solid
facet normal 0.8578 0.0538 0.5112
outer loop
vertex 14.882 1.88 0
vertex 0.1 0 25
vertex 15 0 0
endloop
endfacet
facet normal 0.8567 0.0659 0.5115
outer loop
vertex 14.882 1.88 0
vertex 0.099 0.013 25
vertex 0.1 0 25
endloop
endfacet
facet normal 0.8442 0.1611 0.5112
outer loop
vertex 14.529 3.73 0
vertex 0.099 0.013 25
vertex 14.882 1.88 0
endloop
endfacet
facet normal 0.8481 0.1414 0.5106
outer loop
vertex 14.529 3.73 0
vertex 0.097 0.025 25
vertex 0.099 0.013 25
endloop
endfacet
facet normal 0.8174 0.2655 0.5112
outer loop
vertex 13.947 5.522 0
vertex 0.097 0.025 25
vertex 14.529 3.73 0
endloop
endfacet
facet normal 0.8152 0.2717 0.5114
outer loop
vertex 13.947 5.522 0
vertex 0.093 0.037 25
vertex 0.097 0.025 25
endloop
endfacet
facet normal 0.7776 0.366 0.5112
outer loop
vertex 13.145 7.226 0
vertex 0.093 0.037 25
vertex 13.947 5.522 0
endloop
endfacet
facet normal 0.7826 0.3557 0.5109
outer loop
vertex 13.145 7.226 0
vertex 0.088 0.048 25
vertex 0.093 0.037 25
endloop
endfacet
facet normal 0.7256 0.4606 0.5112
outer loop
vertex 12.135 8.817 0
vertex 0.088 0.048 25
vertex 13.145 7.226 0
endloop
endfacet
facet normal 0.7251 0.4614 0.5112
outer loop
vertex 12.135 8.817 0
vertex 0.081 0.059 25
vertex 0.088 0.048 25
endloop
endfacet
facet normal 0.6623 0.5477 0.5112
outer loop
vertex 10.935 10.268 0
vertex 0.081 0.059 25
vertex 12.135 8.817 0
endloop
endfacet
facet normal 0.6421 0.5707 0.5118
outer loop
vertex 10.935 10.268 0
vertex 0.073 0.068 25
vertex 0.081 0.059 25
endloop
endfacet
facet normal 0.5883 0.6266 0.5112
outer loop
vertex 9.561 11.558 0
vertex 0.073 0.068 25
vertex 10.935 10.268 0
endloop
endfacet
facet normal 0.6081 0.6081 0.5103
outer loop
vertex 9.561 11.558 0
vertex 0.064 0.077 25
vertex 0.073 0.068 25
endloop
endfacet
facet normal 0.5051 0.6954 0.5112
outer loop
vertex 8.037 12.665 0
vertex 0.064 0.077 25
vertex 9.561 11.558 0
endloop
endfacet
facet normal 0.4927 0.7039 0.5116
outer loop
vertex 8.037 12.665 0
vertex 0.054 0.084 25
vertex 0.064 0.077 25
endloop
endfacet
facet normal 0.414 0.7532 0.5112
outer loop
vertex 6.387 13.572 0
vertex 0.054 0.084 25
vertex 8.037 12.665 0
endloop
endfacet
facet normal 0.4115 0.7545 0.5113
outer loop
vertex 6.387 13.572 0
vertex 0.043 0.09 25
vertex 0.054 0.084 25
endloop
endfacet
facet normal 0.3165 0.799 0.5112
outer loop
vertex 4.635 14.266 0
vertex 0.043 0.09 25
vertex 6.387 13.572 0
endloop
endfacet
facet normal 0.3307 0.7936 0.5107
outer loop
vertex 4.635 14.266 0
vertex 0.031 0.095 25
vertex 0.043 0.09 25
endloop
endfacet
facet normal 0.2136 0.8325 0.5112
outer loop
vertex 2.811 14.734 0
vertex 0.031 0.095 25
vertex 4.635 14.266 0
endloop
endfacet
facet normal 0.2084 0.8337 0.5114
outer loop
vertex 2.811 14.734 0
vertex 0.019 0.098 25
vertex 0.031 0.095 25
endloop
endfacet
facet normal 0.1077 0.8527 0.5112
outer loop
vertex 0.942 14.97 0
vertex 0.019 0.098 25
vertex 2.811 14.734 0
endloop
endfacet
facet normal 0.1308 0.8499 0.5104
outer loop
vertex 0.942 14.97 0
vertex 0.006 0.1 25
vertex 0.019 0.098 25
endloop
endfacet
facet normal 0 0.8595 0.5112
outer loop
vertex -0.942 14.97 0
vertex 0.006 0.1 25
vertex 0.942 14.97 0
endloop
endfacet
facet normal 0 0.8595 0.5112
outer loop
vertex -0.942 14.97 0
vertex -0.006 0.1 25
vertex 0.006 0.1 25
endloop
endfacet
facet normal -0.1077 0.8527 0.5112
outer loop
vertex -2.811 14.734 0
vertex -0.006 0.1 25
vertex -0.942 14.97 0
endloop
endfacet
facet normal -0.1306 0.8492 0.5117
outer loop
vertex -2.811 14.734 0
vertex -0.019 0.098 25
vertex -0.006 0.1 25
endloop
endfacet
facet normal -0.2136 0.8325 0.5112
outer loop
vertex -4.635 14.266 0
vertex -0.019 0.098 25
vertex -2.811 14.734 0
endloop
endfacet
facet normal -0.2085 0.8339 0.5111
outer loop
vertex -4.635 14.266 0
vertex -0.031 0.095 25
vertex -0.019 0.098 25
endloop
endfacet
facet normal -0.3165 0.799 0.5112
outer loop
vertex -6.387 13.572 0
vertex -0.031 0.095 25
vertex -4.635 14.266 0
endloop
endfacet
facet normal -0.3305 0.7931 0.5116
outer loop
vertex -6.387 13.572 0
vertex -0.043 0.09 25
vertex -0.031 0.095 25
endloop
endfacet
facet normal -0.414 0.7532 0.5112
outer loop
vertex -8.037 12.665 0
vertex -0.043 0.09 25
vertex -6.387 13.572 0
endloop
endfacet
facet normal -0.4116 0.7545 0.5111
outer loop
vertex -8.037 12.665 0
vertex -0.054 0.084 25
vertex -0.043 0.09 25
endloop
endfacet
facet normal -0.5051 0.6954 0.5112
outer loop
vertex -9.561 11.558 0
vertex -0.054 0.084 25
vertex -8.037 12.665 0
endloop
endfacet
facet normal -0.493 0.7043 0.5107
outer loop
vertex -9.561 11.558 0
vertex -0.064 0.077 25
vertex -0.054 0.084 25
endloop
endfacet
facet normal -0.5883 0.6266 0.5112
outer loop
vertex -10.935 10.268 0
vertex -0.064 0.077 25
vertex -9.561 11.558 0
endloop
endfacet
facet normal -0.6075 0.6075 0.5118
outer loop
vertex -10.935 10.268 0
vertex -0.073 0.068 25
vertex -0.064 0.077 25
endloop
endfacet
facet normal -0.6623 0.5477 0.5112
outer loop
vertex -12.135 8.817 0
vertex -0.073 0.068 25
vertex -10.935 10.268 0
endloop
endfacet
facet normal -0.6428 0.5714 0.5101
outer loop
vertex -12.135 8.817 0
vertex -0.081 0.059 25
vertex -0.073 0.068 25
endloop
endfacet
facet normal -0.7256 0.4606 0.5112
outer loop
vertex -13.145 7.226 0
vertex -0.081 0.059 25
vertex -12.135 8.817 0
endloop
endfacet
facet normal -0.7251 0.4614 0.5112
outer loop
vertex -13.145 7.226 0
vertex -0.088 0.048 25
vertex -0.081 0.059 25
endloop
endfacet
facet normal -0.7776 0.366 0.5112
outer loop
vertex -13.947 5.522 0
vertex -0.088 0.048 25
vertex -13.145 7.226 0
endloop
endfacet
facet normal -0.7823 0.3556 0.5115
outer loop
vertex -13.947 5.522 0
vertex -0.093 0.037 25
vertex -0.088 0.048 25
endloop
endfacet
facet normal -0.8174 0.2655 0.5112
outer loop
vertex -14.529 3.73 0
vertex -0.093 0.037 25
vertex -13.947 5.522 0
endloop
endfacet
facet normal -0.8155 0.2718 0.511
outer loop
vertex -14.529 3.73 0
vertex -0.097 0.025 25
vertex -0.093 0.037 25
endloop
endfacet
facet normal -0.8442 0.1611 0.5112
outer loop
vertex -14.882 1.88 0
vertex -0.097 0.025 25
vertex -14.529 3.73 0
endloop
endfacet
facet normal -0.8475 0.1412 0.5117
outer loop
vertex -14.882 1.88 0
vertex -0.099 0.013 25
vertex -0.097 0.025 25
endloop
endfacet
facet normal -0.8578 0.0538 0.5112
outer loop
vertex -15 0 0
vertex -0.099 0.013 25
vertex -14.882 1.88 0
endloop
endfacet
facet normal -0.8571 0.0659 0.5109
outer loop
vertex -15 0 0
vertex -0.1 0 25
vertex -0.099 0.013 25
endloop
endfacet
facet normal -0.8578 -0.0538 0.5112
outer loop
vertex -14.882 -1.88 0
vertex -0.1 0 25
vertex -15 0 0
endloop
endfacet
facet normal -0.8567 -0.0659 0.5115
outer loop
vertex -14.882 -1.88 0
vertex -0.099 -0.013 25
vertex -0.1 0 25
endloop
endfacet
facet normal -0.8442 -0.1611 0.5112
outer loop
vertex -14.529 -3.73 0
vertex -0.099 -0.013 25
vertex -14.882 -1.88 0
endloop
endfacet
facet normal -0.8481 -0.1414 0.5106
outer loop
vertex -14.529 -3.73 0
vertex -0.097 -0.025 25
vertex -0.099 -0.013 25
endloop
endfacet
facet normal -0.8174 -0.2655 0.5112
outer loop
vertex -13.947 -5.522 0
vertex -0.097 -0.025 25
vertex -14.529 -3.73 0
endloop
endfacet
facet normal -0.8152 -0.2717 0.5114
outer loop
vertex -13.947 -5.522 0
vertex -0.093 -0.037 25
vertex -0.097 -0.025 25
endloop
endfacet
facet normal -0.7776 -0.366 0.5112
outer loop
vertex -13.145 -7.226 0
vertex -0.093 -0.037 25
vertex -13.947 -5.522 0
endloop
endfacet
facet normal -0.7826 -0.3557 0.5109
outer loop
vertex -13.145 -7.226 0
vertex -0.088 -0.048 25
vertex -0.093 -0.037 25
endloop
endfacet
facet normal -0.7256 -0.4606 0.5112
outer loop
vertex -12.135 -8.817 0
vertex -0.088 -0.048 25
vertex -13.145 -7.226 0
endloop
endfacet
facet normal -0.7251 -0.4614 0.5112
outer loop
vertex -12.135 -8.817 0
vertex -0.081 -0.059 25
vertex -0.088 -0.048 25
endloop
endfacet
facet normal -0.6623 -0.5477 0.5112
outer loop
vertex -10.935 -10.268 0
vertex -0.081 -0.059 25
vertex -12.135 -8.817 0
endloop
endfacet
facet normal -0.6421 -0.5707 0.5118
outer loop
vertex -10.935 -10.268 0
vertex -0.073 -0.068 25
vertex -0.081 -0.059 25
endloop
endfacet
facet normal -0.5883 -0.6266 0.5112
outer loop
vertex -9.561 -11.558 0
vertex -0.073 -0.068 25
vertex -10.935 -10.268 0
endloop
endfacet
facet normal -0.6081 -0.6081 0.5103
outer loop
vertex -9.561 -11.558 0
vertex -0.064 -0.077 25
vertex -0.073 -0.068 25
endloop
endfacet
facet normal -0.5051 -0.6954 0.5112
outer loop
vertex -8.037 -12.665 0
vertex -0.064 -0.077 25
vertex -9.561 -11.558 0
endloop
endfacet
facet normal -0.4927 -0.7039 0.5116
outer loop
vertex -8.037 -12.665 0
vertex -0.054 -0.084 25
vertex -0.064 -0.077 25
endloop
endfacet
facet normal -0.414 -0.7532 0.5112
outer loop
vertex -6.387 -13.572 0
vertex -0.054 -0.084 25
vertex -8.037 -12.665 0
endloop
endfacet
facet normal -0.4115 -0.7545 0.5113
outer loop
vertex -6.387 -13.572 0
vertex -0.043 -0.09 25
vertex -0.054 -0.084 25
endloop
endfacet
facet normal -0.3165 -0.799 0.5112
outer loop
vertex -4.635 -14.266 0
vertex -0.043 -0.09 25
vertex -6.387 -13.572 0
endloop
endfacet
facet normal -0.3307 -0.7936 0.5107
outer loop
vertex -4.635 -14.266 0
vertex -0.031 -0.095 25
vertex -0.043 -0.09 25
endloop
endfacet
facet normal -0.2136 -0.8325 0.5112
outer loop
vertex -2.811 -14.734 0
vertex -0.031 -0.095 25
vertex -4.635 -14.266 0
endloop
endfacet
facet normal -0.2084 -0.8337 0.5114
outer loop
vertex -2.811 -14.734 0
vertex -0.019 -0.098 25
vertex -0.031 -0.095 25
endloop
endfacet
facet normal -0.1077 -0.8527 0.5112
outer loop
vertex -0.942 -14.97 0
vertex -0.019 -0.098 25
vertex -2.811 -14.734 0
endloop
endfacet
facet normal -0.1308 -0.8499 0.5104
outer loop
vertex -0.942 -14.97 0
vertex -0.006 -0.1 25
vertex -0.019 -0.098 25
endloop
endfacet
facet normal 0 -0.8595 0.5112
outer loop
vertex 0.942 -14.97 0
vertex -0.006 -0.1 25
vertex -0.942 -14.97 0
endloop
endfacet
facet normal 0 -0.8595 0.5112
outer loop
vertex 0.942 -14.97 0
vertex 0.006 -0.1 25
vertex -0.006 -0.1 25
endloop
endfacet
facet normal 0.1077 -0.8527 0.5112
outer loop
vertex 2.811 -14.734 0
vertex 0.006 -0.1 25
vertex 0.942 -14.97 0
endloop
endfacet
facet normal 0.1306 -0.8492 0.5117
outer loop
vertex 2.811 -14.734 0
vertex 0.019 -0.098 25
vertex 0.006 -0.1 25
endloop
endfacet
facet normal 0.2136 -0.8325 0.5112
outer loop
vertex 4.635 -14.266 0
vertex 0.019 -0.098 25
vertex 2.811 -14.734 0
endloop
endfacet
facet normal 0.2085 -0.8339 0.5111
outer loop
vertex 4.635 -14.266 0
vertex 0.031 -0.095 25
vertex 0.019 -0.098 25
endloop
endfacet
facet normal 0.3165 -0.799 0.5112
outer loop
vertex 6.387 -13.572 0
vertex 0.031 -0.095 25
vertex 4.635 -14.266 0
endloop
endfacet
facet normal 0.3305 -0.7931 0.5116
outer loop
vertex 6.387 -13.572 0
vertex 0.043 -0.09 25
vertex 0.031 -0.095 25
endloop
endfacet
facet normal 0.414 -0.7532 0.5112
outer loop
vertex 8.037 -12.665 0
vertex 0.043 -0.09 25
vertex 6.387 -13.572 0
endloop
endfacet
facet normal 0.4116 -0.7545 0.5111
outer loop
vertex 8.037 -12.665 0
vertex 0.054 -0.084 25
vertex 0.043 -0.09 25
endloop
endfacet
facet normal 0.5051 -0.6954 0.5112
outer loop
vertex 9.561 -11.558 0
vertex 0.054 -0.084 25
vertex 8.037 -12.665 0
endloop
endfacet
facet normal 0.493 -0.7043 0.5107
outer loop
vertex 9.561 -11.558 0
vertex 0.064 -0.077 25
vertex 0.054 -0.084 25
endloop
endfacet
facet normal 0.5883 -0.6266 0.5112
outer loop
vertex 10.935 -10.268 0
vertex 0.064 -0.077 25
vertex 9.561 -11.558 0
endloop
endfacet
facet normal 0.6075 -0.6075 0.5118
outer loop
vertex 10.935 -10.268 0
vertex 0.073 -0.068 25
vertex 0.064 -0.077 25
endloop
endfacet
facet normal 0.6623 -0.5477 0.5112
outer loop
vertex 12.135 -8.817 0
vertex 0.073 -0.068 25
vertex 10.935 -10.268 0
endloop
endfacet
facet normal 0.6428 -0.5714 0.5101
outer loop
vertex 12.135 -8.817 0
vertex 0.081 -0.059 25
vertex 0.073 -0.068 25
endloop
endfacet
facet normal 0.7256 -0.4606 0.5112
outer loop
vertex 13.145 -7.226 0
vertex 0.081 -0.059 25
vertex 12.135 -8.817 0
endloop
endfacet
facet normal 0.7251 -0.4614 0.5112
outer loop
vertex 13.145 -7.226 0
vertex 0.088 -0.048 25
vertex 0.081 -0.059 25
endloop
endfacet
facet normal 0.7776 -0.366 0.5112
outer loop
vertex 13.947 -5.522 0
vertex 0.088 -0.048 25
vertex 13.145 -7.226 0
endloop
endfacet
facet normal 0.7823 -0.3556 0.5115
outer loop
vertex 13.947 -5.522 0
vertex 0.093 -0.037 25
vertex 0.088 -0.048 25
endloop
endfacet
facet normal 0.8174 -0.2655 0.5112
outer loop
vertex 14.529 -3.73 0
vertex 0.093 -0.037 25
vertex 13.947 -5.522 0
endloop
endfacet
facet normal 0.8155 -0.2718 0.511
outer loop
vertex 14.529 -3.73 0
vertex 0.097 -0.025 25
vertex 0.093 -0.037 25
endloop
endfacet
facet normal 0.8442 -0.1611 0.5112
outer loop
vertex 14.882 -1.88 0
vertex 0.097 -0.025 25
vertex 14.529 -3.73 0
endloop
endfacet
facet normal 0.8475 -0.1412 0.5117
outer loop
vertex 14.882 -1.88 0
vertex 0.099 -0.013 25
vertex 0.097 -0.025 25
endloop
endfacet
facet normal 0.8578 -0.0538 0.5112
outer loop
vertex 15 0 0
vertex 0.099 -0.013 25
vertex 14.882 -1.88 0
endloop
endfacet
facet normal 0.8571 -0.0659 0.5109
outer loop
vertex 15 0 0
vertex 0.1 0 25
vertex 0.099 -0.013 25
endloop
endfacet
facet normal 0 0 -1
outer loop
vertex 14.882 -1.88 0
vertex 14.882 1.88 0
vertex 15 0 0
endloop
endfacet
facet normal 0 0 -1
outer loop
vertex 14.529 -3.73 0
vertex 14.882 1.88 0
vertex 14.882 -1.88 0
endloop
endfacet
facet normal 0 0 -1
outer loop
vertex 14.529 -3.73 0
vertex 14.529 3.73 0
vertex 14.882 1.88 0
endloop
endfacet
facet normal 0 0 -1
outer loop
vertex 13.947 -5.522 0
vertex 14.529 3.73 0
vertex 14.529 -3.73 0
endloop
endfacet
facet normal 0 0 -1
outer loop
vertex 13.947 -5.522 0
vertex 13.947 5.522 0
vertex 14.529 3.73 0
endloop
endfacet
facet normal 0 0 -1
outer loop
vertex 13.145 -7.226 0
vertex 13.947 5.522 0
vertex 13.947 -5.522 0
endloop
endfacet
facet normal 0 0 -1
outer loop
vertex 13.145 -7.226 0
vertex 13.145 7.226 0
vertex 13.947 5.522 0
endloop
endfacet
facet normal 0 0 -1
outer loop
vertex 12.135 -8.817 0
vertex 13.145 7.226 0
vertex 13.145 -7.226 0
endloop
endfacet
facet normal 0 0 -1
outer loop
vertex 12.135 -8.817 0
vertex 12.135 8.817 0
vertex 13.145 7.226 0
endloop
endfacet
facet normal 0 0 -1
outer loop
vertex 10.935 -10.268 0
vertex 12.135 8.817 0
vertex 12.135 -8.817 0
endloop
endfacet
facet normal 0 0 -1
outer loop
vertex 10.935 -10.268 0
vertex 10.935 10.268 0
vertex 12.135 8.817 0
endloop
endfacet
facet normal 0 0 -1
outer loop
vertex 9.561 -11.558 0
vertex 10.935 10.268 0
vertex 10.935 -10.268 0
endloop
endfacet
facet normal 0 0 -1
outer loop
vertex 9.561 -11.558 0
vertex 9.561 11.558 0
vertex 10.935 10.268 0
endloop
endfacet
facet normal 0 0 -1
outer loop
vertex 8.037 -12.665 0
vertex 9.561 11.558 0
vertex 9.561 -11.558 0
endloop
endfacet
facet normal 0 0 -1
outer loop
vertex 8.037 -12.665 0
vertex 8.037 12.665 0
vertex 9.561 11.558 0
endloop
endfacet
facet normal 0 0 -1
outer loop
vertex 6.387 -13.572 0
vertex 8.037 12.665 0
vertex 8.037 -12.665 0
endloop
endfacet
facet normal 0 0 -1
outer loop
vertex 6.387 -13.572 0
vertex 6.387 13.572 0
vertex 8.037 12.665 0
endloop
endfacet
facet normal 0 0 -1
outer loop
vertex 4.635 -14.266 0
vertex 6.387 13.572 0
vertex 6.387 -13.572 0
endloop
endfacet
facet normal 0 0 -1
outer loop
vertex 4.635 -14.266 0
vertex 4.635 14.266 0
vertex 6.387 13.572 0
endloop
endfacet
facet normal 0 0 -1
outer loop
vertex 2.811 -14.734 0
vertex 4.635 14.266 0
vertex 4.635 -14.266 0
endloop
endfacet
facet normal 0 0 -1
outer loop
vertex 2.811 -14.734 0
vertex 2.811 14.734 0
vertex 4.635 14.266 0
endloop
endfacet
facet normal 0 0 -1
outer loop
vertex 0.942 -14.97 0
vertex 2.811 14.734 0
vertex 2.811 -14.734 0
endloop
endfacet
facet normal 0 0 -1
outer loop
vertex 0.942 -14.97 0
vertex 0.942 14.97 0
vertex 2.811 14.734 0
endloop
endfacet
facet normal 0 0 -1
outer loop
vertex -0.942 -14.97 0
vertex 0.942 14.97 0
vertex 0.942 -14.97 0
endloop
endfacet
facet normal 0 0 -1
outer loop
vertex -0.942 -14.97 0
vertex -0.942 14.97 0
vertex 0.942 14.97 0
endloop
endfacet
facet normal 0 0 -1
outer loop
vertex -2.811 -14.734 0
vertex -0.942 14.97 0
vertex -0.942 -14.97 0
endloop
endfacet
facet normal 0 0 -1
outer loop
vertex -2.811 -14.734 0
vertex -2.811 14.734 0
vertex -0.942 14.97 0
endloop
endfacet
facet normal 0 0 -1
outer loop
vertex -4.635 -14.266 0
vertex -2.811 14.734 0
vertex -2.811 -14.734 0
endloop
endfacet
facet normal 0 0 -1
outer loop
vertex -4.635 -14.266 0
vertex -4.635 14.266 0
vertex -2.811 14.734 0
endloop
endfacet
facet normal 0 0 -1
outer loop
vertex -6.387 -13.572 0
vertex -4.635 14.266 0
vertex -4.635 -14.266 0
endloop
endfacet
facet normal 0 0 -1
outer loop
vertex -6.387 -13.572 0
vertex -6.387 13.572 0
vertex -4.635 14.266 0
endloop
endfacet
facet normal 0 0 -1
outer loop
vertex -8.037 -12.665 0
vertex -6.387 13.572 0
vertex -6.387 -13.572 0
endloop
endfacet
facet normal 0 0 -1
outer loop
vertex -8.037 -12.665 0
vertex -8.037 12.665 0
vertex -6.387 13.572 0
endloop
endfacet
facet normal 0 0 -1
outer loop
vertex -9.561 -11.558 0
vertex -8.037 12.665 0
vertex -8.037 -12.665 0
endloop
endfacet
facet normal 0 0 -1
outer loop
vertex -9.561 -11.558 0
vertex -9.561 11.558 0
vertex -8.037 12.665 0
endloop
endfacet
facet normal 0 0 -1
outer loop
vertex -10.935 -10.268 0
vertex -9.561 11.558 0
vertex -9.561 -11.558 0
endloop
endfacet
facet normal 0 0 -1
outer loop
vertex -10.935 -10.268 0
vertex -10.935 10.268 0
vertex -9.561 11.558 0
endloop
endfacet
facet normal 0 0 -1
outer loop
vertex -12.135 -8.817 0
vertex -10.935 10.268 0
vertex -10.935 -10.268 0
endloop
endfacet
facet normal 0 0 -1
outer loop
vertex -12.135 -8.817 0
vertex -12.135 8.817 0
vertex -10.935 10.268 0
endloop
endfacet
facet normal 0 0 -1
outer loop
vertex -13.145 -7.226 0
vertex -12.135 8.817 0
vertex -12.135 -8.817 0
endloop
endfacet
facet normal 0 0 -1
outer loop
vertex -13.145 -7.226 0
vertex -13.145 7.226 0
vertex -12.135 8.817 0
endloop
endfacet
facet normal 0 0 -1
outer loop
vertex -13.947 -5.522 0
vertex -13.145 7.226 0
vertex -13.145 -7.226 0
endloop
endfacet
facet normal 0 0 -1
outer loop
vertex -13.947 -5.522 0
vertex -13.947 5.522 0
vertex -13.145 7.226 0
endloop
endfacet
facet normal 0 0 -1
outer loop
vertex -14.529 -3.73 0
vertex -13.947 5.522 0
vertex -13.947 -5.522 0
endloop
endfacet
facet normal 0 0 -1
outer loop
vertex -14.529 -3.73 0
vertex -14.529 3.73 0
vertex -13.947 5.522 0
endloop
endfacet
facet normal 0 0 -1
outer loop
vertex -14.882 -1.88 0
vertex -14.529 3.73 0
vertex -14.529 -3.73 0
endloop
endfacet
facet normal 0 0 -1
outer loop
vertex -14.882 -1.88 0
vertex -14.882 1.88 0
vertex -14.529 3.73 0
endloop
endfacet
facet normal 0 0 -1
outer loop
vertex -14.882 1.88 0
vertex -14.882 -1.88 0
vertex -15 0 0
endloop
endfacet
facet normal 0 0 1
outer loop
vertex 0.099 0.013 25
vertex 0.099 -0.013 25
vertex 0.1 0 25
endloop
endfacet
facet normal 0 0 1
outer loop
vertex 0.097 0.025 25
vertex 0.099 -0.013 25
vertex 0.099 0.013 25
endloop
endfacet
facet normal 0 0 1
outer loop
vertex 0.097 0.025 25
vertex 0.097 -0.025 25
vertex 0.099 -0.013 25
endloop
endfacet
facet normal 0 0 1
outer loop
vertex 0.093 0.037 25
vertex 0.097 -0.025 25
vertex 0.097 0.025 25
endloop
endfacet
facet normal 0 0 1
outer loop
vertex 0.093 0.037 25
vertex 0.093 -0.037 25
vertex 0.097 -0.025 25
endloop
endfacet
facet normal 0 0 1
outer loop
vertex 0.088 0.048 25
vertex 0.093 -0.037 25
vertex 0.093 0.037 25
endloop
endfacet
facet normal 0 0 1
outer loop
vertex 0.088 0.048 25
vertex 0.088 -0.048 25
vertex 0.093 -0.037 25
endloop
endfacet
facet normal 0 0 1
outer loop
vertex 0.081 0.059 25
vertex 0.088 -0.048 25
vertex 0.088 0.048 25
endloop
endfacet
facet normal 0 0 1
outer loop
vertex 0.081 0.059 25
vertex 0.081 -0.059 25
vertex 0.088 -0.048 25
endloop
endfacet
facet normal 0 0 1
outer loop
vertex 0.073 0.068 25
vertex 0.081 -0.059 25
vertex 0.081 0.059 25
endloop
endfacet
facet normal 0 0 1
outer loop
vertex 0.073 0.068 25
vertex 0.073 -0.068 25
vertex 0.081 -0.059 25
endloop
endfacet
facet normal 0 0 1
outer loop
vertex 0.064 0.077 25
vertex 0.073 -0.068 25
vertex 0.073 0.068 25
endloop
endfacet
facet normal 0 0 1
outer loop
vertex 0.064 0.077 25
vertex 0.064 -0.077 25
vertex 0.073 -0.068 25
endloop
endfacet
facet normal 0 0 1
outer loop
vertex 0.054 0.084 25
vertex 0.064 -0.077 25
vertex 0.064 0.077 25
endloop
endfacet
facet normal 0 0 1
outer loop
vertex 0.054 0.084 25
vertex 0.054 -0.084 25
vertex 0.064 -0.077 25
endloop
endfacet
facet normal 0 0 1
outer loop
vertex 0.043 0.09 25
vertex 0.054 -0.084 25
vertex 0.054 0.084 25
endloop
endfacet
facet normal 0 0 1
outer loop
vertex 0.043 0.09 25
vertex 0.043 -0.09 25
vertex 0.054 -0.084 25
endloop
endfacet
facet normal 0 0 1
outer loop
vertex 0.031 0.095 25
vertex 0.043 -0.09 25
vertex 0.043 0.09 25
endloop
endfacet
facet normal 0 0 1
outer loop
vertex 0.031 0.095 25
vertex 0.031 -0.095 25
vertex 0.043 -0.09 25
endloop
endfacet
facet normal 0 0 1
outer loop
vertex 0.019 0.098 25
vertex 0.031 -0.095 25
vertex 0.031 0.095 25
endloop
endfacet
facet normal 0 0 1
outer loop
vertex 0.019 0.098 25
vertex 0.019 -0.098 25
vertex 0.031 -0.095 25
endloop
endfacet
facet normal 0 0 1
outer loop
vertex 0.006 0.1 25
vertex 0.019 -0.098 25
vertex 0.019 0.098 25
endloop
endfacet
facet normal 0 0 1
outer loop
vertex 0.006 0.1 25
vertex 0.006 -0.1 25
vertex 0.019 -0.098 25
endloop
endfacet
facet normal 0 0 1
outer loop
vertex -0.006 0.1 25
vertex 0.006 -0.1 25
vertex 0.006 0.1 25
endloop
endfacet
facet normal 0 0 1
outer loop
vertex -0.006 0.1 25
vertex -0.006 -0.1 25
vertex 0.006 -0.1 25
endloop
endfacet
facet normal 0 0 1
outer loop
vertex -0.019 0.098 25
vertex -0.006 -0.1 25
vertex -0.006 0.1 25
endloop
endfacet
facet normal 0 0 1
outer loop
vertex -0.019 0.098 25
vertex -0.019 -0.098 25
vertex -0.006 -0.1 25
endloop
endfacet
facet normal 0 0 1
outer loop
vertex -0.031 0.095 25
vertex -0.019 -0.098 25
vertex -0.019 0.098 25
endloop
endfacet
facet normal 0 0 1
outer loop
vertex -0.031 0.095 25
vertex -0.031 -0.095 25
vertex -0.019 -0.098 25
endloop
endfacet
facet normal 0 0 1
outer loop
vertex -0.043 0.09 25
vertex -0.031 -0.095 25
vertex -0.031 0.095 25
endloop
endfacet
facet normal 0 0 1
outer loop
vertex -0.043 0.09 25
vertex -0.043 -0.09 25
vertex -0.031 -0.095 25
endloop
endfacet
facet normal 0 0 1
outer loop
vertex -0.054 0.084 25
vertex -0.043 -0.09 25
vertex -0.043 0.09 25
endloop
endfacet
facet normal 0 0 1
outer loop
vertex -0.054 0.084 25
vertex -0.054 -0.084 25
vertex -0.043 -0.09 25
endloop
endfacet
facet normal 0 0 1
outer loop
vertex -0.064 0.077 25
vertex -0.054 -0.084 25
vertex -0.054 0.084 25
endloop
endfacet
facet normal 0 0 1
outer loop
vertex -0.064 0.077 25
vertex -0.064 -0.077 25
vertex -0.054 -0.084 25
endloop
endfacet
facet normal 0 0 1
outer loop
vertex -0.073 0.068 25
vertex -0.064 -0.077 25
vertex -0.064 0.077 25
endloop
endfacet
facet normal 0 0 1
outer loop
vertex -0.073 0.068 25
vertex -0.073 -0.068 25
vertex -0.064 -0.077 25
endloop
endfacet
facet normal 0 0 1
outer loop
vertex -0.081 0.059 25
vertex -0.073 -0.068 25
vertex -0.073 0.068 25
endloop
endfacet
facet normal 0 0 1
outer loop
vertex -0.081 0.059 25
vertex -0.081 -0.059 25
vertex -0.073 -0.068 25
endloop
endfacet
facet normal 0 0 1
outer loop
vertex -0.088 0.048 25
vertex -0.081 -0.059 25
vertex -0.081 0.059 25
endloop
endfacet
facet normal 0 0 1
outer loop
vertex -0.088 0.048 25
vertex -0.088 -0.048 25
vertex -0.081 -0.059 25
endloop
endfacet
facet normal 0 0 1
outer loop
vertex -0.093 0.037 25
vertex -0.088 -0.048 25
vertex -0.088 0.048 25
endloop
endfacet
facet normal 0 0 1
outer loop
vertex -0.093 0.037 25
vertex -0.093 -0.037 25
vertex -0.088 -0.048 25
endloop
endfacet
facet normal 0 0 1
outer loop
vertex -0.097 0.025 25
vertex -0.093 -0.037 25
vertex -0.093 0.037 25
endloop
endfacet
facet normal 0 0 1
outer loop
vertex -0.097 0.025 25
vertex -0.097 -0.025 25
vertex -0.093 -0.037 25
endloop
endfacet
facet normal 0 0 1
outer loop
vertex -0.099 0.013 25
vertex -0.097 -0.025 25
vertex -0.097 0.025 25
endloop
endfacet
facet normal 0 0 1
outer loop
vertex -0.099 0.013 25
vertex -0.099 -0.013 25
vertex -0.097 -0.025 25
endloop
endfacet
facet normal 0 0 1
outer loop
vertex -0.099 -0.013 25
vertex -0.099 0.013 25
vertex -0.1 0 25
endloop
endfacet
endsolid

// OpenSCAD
base = 30;
height = 25;
tip = 0.2;
$fn = 50;

cylinder(d1=base,d2=tip,h=height);
